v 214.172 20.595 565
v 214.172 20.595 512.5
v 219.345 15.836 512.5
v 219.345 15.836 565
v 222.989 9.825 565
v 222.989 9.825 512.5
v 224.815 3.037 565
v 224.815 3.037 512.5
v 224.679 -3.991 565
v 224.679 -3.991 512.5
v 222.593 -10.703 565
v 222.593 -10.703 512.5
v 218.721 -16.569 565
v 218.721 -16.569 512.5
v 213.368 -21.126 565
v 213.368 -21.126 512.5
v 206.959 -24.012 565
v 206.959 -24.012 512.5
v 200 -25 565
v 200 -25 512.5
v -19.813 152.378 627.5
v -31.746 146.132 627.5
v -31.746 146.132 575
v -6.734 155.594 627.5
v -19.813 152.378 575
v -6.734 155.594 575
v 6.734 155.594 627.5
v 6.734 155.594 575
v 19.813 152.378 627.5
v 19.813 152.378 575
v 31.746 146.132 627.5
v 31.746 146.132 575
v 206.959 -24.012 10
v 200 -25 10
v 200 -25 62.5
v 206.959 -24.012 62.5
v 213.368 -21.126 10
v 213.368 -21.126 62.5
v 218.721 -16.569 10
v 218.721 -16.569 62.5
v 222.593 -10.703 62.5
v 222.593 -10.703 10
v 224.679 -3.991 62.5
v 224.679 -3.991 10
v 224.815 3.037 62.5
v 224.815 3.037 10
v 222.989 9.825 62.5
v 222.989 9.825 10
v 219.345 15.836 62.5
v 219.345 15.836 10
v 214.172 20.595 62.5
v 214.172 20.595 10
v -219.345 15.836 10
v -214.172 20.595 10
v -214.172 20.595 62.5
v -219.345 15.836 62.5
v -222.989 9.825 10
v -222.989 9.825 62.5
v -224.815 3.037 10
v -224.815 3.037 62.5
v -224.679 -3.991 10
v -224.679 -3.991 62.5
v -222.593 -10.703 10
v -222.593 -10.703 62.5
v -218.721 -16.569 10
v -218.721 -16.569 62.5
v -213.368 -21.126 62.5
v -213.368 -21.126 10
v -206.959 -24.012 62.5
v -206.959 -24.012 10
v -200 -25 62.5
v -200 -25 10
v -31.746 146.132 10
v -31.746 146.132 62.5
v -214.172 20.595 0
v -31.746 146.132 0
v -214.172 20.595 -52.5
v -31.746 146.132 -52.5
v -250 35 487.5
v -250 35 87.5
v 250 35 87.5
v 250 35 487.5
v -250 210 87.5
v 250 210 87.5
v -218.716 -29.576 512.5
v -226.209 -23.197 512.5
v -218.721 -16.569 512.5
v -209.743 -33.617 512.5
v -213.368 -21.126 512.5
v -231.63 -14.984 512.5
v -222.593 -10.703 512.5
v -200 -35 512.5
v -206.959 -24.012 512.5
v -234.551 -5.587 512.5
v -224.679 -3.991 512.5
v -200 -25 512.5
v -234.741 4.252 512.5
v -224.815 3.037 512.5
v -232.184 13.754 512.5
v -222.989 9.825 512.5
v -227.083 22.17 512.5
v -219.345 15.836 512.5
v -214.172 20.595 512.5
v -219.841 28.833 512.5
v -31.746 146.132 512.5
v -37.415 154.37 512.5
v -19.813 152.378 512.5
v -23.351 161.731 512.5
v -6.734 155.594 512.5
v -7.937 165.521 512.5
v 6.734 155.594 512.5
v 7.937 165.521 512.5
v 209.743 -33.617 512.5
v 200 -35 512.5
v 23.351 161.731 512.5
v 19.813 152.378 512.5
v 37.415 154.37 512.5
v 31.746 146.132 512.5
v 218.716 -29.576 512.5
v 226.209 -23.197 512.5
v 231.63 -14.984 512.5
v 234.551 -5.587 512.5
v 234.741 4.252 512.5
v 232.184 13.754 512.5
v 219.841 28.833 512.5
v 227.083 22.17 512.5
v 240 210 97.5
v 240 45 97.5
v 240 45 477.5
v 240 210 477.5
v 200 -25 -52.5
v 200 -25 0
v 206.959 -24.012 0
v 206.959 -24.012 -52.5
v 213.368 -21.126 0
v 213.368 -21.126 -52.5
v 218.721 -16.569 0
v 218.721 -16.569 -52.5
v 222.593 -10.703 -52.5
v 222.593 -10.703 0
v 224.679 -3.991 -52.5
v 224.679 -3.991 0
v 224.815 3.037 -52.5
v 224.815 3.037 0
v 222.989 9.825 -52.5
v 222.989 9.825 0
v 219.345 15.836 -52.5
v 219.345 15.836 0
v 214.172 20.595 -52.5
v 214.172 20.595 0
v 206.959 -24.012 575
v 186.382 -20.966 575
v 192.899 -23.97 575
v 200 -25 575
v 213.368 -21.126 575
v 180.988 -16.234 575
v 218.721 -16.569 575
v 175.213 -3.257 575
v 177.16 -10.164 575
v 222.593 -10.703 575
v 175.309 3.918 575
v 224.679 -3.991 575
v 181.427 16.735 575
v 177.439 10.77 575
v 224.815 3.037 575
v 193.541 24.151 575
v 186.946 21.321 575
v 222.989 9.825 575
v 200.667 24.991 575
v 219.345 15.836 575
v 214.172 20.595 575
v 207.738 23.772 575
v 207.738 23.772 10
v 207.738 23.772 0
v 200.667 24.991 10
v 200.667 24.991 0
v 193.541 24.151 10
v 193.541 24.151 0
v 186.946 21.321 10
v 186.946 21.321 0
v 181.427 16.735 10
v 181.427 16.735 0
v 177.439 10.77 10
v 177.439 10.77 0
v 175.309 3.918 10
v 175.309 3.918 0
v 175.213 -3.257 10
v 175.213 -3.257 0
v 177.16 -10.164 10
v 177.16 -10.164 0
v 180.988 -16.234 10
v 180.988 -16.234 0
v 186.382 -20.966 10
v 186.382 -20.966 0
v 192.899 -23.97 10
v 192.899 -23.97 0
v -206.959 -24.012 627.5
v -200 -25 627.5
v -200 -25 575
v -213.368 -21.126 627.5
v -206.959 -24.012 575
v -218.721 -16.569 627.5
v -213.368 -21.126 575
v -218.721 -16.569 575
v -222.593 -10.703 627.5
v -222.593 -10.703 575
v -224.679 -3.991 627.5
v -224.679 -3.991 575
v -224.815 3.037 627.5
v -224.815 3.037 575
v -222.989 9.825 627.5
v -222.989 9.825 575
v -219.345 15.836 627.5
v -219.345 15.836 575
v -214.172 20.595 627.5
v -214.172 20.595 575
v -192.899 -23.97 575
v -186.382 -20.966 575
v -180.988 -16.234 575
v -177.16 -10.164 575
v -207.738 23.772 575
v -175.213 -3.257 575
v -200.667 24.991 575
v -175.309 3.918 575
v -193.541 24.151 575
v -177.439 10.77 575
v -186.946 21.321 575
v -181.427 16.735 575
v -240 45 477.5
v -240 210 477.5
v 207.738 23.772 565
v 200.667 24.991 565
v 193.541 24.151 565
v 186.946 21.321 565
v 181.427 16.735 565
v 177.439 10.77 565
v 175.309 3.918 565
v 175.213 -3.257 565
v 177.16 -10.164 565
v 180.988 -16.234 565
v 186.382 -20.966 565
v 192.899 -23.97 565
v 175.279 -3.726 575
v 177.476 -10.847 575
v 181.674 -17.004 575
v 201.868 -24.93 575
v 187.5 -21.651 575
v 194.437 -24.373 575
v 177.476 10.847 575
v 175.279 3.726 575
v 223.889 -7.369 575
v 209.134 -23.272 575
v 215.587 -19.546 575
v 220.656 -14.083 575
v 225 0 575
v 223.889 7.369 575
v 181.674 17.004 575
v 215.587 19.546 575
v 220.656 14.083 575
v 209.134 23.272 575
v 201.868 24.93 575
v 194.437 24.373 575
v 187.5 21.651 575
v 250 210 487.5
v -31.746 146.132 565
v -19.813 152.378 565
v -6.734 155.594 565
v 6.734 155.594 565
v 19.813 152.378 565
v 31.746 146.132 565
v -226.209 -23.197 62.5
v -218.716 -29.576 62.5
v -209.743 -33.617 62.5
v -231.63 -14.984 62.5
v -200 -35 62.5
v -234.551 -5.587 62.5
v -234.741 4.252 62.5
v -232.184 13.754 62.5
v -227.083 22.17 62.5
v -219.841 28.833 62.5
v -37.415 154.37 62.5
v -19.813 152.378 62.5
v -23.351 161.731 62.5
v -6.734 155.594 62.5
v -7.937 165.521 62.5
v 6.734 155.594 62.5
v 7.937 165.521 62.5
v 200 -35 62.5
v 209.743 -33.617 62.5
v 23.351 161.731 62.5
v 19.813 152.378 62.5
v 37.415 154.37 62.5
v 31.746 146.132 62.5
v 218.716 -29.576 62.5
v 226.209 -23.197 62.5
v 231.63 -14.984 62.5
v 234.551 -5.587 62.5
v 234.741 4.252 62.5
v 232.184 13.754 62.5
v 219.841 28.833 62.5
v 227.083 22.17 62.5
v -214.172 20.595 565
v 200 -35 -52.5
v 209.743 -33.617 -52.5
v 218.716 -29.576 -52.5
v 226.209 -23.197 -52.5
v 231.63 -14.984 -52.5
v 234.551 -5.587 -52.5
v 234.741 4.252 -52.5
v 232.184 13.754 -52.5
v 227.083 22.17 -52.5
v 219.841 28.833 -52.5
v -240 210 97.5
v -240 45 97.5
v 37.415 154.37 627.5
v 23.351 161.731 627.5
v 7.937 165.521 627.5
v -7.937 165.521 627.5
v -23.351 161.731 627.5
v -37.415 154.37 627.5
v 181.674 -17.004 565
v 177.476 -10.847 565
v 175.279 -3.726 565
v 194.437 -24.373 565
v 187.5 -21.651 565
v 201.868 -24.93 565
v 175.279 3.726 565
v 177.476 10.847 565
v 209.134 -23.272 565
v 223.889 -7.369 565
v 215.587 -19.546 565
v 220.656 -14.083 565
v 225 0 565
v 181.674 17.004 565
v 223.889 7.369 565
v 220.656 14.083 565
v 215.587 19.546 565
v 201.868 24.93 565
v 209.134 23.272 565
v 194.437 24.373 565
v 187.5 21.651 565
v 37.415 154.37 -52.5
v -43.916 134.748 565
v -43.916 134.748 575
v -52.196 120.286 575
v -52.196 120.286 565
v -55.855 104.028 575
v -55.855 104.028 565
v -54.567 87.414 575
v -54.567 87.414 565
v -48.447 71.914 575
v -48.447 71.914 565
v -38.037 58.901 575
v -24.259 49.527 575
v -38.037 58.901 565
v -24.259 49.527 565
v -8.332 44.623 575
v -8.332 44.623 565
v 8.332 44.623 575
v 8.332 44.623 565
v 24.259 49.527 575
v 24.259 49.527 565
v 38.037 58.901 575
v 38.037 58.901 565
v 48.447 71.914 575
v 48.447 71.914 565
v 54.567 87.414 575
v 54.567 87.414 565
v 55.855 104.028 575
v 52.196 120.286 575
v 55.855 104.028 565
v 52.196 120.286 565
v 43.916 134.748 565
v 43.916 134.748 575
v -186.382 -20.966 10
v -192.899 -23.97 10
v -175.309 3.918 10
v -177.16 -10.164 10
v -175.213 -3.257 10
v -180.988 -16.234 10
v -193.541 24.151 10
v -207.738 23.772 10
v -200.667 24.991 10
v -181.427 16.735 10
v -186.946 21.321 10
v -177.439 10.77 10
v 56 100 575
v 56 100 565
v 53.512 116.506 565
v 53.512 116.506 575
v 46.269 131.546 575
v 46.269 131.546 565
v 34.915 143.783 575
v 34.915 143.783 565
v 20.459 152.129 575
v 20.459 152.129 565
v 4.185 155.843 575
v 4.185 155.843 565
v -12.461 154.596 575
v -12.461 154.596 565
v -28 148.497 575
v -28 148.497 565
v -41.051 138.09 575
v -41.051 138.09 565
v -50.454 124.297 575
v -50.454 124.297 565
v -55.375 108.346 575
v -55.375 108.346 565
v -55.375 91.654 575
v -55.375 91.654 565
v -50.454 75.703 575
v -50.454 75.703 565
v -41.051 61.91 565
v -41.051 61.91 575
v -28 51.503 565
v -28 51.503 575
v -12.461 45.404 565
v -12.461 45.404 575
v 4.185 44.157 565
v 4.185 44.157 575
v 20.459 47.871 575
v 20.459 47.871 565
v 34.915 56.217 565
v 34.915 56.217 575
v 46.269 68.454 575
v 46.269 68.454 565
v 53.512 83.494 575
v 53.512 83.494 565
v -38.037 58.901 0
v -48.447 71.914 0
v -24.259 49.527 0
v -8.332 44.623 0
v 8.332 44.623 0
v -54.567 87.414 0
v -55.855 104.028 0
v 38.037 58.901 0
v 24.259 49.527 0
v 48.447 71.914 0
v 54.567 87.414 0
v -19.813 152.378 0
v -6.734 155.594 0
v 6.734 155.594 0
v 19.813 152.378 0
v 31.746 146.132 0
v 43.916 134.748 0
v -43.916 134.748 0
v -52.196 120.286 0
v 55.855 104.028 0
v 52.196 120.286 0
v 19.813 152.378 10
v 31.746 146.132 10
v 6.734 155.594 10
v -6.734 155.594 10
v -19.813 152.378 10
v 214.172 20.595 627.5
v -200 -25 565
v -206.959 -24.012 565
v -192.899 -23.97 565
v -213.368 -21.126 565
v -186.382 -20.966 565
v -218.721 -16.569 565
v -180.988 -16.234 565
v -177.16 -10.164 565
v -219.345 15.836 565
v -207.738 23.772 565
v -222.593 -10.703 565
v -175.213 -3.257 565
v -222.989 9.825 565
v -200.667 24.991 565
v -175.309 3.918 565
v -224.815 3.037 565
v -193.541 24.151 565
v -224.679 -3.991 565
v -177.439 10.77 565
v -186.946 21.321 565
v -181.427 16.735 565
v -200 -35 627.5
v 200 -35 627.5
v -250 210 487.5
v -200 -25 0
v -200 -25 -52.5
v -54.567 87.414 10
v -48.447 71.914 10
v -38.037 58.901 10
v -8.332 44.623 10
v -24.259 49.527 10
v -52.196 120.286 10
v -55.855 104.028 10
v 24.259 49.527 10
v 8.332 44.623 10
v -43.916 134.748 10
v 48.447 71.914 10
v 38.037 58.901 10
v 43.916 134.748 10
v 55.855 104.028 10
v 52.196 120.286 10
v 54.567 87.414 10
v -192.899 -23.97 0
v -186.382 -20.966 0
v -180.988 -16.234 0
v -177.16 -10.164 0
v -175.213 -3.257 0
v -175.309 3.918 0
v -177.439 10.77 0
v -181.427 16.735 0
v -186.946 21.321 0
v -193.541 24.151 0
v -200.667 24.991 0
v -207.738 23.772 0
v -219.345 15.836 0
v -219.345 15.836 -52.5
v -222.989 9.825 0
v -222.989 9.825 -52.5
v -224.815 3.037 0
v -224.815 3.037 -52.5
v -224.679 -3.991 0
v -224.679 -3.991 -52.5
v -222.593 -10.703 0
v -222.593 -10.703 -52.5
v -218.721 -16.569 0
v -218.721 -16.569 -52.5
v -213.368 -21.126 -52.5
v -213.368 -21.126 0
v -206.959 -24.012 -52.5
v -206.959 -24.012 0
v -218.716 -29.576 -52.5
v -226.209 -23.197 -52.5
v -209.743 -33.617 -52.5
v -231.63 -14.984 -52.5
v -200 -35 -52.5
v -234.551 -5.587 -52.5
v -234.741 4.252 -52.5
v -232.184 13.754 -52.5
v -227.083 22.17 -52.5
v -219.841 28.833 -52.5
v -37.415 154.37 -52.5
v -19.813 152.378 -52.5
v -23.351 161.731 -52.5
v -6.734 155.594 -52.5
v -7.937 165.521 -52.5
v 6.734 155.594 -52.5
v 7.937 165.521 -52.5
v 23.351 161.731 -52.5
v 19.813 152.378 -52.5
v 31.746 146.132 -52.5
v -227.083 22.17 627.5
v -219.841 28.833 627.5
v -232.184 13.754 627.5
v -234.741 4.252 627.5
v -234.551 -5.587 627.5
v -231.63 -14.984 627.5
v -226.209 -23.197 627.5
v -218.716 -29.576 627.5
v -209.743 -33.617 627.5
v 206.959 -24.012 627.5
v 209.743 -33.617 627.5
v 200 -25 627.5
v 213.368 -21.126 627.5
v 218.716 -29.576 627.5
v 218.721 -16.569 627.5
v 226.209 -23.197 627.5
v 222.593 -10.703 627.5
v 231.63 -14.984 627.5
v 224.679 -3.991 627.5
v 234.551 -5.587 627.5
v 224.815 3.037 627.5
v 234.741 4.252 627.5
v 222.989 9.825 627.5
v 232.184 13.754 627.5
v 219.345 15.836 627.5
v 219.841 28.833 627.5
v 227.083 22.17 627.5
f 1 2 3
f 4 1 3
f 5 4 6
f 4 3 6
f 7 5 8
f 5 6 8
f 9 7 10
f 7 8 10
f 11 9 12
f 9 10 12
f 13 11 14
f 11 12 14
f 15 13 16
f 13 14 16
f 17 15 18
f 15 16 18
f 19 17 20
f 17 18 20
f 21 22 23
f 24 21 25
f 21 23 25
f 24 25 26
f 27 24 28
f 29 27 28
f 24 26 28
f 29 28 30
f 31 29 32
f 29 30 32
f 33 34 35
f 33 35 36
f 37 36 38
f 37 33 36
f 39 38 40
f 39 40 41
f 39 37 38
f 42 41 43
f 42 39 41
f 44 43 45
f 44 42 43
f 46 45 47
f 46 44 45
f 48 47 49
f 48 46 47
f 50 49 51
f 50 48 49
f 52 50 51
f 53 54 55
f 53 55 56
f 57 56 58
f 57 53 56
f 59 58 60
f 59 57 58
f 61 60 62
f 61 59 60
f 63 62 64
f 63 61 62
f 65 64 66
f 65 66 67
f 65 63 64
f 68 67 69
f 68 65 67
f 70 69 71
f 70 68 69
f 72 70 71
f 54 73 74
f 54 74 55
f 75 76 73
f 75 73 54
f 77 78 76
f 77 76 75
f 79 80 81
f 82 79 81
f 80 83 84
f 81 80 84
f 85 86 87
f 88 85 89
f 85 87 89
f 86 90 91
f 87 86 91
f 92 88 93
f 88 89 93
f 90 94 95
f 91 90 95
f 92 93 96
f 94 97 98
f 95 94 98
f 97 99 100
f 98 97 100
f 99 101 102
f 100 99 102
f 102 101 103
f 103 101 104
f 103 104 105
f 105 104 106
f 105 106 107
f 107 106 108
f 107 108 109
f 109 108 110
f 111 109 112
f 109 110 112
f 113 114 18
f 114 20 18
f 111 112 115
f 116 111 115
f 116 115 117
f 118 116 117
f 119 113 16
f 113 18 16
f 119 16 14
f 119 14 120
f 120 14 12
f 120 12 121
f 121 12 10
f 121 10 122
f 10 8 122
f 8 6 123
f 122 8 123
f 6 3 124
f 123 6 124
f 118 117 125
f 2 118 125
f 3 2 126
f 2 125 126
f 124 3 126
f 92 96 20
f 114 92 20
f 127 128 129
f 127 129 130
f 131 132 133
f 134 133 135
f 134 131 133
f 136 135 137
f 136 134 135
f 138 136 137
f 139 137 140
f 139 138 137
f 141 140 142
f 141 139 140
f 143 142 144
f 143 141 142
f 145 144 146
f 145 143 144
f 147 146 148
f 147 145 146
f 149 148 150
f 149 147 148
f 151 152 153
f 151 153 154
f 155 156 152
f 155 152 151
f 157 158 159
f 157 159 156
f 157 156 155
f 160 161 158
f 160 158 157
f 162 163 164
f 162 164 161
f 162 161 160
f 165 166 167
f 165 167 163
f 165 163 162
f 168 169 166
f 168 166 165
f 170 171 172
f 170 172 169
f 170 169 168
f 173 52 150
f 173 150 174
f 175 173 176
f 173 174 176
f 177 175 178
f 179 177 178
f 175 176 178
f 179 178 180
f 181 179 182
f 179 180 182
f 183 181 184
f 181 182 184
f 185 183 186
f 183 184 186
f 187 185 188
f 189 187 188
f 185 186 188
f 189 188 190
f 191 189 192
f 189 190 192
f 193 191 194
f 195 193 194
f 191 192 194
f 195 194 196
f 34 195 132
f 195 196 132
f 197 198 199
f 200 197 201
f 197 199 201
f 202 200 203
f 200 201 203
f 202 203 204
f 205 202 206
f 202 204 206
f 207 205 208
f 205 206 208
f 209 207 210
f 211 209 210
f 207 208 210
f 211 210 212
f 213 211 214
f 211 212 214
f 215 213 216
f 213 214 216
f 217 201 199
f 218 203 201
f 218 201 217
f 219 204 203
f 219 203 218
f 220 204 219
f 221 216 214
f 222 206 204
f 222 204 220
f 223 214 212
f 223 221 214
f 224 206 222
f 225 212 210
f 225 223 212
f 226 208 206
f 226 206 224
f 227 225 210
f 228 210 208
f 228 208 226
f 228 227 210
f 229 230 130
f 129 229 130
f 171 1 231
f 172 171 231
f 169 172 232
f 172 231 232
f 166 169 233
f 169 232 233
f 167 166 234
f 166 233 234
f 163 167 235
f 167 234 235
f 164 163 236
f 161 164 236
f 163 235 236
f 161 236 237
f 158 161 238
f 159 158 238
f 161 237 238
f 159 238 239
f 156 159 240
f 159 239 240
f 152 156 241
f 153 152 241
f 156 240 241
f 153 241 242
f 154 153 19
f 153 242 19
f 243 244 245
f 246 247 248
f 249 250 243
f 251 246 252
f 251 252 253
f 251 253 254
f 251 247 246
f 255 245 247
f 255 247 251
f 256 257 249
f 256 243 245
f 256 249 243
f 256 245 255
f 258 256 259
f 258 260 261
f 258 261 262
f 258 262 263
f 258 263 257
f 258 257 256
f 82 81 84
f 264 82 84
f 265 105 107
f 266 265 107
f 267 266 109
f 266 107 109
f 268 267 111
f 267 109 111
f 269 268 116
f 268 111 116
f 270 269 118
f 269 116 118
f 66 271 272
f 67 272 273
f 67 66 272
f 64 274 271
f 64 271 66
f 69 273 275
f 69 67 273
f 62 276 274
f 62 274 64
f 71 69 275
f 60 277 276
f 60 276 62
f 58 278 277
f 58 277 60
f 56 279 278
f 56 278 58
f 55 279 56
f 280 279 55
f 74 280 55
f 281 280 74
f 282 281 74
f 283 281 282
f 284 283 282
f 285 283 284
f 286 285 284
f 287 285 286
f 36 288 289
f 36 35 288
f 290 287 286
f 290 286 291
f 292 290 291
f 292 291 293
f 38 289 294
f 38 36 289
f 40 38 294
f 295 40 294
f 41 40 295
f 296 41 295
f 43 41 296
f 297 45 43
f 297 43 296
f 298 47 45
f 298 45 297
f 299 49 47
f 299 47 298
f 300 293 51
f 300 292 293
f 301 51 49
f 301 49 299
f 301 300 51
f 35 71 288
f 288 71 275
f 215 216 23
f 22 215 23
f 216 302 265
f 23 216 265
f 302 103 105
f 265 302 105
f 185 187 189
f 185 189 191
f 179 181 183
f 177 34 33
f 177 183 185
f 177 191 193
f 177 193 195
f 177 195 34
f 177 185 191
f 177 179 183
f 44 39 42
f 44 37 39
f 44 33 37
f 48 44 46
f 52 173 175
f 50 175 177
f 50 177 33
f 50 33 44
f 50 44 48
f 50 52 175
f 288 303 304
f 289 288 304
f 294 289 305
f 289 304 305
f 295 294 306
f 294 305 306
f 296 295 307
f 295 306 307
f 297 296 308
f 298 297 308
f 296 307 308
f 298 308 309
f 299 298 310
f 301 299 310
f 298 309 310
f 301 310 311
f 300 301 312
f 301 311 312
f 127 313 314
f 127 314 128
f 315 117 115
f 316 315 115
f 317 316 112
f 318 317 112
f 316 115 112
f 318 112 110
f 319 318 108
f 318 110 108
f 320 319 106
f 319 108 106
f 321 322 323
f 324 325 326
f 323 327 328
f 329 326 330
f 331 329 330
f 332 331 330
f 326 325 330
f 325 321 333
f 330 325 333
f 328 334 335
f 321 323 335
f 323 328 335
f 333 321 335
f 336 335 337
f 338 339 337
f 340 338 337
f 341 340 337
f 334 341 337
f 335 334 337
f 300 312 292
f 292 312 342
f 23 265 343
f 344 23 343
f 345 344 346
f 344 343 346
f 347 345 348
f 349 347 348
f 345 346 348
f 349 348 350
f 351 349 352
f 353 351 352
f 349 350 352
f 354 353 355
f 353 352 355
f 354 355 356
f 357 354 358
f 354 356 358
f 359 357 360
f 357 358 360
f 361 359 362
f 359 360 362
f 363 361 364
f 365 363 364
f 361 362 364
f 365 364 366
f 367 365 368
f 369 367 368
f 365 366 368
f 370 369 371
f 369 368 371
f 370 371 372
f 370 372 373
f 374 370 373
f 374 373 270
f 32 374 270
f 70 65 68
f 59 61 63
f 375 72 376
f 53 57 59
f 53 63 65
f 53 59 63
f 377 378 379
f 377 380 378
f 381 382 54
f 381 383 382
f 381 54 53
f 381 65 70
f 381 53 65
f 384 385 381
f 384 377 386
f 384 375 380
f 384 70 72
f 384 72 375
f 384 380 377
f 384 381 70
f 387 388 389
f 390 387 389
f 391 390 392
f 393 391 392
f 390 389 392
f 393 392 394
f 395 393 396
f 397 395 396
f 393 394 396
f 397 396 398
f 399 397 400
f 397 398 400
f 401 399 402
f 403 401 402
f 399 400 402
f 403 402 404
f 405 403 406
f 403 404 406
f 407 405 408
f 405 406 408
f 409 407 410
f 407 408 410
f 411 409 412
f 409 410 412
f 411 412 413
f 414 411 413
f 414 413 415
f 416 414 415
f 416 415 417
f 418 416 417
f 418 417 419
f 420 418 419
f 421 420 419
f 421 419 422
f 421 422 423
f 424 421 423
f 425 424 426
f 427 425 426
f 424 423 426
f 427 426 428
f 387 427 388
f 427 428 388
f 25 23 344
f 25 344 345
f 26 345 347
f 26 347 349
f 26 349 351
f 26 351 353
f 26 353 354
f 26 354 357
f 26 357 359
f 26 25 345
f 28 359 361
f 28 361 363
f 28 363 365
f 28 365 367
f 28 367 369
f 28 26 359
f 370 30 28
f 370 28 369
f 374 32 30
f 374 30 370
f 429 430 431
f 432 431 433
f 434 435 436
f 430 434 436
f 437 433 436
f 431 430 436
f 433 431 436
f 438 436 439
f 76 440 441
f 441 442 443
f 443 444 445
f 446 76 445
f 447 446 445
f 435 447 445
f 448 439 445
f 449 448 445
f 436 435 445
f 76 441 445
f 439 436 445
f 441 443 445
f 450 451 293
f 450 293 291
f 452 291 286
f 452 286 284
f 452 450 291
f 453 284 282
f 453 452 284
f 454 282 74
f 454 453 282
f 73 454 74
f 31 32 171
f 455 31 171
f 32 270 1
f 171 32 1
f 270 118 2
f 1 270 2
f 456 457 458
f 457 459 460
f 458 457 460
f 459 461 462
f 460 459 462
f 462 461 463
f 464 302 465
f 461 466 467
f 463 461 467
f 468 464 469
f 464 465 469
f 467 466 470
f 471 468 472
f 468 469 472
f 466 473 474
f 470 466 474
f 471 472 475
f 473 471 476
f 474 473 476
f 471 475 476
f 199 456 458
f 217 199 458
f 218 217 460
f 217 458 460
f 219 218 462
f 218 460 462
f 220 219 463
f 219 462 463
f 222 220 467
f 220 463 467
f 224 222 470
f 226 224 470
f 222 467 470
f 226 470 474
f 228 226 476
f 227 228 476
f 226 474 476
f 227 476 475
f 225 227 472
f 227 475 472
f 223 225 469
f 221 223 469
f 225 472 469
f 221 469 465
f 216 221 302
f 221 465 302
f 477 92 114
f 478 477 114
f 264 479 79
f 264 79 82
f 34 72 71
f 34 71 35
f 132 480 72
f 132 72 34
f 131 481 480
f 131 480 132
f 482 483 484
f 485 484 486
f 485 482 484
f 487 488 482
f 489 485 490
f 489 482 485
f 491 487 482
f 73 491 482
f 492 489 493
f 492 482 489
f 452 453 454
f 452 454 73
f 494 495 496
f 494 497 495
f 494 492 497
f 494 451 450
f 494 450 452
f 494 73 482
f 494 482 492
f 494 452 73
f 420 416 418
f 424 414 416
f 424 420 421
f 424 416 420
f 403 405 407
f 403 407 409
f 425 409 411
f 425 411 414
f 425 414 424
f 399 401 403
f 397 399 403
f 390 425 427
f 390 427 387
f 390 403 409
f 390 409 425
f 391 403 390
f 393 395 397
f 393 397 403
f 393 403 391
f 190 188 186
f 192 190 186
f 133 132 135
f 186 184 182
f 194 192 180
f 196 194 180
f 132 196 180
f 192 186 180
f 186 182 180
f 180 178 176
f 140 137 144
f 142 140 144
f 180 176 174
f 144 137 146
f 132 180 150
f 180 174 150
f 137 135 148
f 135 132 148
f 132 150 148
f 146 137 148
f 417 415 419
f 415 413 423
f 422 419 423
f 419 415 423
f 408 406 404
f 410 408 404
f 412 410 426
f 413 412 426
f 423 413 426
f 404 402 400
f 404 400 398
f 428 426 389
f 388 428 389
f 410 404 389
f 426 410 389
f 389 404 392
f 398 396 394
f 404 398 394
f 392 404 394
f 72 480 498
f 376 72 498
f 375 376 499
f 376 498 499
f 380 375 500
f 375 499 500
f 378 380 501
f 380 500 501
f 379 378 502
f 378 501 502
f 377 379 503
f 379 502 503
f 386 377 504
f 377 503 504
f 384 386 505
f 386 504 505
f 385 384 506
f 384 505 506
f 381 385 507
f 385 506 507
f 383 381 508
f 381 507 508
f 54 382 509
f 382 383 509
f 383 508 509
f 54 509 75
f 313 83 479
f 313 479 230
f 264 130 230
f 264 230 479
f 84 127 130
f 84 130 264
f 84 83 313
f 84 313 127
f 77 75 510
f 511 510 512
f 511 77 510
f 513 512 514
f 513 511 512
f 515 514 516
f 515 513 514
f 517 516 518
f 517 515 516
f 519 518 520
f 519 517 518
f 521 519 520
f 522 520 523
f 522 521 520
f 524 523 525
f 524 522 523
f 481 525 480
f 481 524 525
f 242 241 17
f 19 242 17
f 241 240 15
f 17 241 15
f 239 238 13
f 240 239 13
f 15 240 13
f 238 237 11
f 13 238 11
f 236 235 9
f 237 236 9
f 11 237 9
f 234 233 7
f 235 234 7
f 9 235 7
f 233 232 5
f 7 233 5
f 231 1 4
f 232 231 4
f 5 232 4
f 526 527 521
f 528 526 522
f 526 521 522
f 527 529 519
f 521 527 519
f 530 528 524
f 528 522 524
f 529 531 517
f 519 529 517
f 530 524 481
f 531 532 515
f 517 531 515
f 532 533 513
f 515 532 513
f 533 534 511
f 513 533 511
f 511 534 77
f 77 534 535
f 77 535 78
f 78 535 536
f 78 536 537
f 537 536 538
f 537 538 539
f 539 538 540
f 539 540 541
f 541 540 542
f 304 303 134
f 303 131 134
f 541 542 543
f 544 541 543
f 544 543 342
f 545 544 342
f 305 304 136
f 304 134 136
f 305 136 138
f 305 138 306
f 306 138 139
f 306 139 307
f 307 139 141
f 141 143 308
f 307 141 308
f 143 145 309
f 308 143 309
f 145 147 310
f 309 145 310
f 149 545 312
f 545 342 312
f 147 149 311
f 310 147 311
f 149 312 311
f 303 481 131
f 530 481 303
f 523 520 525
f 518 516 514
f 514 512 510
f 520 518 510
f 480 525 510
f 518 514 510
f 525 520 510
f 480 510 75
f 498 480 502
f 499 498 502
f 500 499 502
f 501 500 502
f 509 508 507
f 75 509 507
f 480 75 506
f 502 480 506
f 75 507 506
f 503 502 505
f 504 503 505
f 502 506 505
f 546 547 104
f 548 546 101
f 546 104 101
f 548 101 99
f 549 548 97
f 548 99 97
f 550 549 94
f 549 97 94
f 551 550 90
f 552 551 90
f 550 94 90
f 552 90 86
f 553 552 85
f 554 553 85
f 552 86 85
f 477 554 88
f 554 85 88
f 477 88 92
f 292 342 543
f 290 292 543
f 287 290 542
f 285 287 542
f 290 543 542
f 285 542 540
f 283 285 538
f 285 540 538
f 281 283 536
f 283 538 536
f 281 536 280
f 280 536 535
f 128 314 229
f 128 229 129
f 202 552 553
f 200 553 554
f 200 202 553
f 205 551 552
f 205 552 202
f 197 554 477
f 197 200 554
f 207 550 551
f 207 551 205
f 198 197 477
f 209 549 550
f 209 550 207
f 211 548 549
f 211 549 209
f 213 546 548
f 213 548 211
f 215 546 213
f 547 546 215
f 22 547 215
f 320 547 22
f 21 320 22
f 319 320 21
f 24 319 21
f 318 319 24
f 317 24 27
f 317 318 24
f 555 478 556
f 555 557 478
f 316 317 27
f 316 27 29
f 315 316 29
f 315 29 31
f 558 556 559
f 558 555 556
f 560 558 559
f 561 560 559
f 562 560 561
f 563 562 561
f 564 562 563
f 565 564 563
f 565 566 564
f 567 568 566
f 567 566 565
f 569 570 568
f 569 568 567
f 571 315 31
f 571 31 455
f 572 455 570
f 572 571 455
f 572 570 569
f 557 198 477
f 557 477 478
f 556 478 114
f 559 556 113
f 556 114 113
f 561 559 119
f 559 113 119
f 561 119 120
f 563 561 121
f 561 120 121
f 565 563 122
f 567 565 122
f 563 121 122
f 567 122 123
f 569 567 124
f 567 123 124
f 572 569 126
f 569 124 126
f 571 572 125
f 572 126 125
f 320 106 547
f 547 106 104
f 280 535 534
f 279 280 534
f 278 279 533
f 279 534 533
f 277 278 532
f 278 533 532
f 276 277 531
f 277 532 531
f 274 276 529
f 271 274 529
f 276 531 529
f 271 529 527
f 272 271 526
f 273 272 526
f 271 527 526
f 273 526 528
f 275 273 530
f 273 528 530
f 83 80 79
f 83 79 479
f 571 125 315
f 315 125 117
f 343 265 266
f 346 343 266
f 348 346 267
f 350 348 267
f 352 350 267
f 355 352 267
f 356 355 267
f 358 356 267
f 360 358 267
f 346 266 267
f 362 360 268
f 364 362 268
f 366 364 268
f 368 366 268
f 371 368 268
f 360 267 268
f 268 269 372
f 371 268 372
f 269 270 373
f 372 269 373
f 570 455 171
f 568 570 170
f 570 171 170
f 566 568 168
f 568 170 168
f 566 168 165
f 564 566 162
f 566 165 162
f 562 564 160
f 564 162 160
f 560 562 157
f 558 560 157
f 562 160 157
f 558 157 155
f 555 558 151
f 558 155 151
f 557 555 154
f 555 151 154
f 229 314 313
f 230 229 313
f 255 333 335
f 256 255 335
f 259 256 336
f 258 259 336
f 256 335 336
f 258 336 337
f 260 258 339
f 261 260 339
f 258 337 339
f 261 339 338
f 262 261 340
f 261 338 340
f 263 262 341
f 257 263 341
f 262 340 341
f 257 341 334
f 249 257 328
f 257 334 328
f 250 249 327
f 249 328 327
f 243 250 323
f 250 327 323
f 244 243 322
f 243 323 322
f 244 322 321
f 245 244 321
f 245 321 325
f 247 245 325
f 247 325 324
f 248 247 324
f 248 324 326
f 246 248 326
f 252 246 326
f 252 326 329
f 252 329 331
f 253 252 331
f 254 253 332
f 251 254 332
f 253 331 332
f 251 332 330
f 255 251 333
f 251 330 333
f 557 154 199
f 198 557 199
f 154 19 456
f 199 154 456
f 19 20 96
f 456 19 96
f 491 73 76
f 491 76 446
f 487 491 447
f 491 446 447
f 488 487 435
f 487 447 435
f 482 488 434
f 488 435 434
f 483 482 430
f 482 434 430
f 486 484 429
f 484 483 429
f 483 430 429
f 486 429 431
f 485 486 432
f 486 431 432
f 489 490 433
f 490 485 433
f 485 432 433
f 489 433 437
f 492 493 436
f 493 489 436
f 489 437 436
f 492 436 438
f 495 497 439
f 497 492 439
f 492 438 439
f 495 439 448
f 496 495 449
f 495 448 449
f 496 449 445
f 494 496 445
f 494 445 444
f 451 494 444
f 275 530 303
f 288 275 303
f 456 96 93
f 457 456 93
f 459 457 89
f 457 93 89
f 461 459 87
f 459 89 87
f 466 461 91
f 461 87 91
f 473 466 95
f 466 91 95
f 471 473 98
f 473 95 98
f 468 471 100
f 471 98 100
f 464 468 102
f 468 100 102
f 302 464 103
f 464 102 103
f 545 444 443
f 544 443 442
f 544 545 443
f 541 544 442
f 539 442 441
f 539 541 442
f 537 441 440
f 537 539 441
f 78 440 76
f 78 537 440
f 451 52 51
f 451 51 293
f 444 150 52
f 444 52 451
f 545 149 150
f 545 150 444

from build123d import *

# Parameters (mm, degrees)
SCHIZZO1_R                     = 25
ESTRUSIONE_ESTRUSIONE1_DEPTH   = 10
ESTRUSIONE_ESTRUSIONE1_2_DEPTH = 10
SCHIZZO1_R_2                   = 56
ESTRUSIONE_ESTRUSIONE1_3_DEPTH = 10
ESTRUSIONE_SOTTILE1_START      = -62.5
ESTRUSIONE_SOTTILE1_DEPTH      = 115
SCHIZZO3_W                     = 500
SCHIZZO3_H                     = 175
ESTRUSIONE_ESTRUSIONE2_DEPTH   = 400
RIPETIZIONE_START              = 565
RIPETIZIONE_A_L1_OUTLINE_R     = 56
RIPETIZIONE_A_L1_DEPTH         = 10
RIPETIZIONE_A_L1_2_OUTLINE_R   = 25
RIPETIZIONE_A_L1_2_DEPTH       = 10
RIPETIZIONE_START_2            = 512.5
RIPETIZIONE_A_L1_3_DEPTH       = 115
RIPETIZIONE_A_L1_4_DEPTH       = 10
SVUOTA1_T                      = -10


# Read off the part's stored shape, not the designer's step: Ripetizione a L1
with BuildPart() as part:
    # Schizzo1 → Estrusione-Estrusione1 (new body)
    with BuildSketch(Plane.XY):
        with Locations((-200, 0)):
            Circle(SCHIZZO1_R)
    extrude(amount=ESTRUSIONE_ESTRUSIONE1_DEPTH)



with BuildPart() as body_2:
    # Schizzo1 → Estrusione-Estrusione1 2 (new body)
    with BuildSketch(Plane.XY):
        with Locations((200, 0)):
            Circle(SCHIZZO1_R)
    extrude(amount=ESTRUSIONE_ESTRUSIONE1_2_DEPTH)


with BuildPart() as body_3:
    # Schizzo1 → Estrusione-Estrusione1 3 (new body)
    with BuildSketch(Plane.XY):
        with Locations((0, 100)):
            Circle(SCHIZZO1_R_2)
    extrude(amount=ESTRUSIONE_ESTRUSIONE1_3_DEPTH)


with BuildPart() as part_1:
    add(part.part)

    add(body_2.part)  # Estrusione-Sottile1 merges body 2

    add(body_3.part)  # Estrusione-Sottile1 merges body 3
    # Schizzo2 → Estrusione-Sottile1 (add)
    with BuildSketch(Plane.XY.offset(10).offset(ESTRUSIONE_SOTTILE1_START)):
        with BuildLine():
            Line((219.84132575, 28.8326515), (37.415071414, 154.370142828))
            ThreePointArc((37.415071414, 154.370142828), (0, 166), (-37.415071414, 154.370142828))
            Line((-37.415071414, 154.370142828), (-219.84132575, 28.8326515))
            ThreePointArc((-219.84132575, 28.8326515), (-233.422618109, -10.388868984), (-200, -35))
            Line((-200, -35), (200, -35))
            ThreePointArc((200, -35), (233.422618109, -10.388868984), (219.84132575, 28.8326515))
        make_face()
        with BuildLine():
            Line((214.172375536, 20.594751071), (31.7461212, 146.132242399))
            ThreePointArc((31.7461212, 146.132242399), (0, 156), (-31.7461212, 146.132242399))
            Line((-31.7461212, 146.132242399), (-214.172375536, 20.594751071))
            ThreePointArc((-214.172375536, 20.594751071), (-223.873298649, -7.420620703), (-200, -25))
            Line((-200, -25), (200, -25))
            ThreePointArc((200, -25), (223.873298649, -7.420620703), (214.172375536, 20.594751071))
        make_face(mode=Mode.SUBTRACT)
    extrude(amount=ESTRUSIONE_SOTTILE1_DEPTH)


with BuildPart() as body_2_2:
    # Schizzo3 → Estrusione-Estrusione2 (new body)
    with BuildSketch(Plane.XY.offset(87.5)):
        with Locations((0, 122.5)):
            Rectangle(SCHIZZO3_W, SCHIZZO3_H)
    extrude(amount=ESTRUSIONE_ESTRUSIONE2_DEPTH)

    # Svuota1
    svuota1_openings = [body_2_2.faces().sort_by_distance(p)[0] for p in [
        (0, 210, 287.5),
    ]]
    offset(amount=SVUOTA1_T, openings=svuota1_openings, kind=Kind.INTERSECTION)


with BuildPart() as body_3_2:
    # Ripetizione a L1 outline → Ripetizione a L1 (new body)
    with BuildSketch(Plane.XY.offset(RIPETIZIONE_START)):
        with Locations((0, 100)):
            Circle(RIPETIZIONE_A_L1_OUTLINE_R)
    extrude(amount=RIPETIZIONE_A_L1_DEPTH)


with BuildPart() as body_4:
    # Ripetizione a L1 2 outline → Ripetizione a L1 2 (new body)
    with BuildSketch(Plane.XY.offset(RIPETIZIONE_START)):
        with Locations((200, 0)):
            Circle(RIPETIZIONE_A_L1_2_OUTLINE_R)
    extrude(amount=RIPETIZIONE_A_L1_2_DEPTH)


with BuildPart() as body_5:
    # Ripetizione a L1 3 outline → Ripetizione a L1 3 (new body)
    with BuildSketch(Plane.XY.offset(RIPETIZIONE_START_2)):
        with BuildLine():
            ThreePointArc((37.415071414, 154.370142828), (0, 166), (-37.415071414, 154.370142828))
            Line((-37.415071414, 154.370142828), (-219.84132575, 28.8326515))
            ThreePointArc((-219.84132575, 28.8326515), (-233.422618109, -10.388868983), (-200, -35))
            Line((-200, -35), (200, -35))
            ThreePointArc((200, -35), (233.422618109, -10.388868983), (219.84132575, 28.8326515))
            Line((219.84132575, 28.8326515), (37.415071414, 154.370142828))
        make_face()
        with BuildLine():
            Line((-214.172375536, 20.594751071), (-31.7461212, 146.132242399))
            ThreePointArc((-31.7461212, 146.132242399), (0, 156), (31.7461212, 146.132242399))
            Line((31.7461212, 146.132242399), (214.172375536, 20.594751071))
            ThreePointArc((214.172375536, 20.594751071), (223.873298649, -7.420620703), (200, -25))
            Line((200, -25), (-200, -25))
            ThreePointArc((-200, -25), (-223.873298649, -7.420620703), (-214.172375536, 20.594751071))
        make_face(mode=Mode.SUBTRACT)
    extrude(amount=RIPETIZIONE_A_L1_3_DEPTH)

    # Ripetizione a L1 4 outline → Ripetizione a L1 4 (add)
    with BuildSketch(Plane.XY.offset(RIPETIZIONE_START)):
        with BuildLine():
            ThreePointArc((31.7461212, 146.132242399), (0, 156), (-31.7461212, 146.132242399))
            ThreePointArc((-31.7461212, 146.132242399), (0, 44), (31.7461212, 146.132242399))
        make_face()
        with BuildLine():
            ThreePointArc((-200, -25), (-176.126701351, 7.420620703), (-214.172375536, 20.594751071))
            ThreePointArc((-214.172375536, 20.594751071), (-223.873298649, -7.420620703), (-200, -25))
        make_face()
        with BuildLine():
            ThreePointArc((200, -25), (223.873298649, -7.420620703), (214.172375536, 20.594751071))
            ThreePointArc((214.172375536, 20.594751071), (176.126701351, 7.420620703), (200, -25))
        make_face()
    extrude(amount=RIPETIZIONE_A_L1_4_DEPTH)


solid = Compound([part_1.part, body_2_2.part, body_3_2.part, body_4.part, body_5.part])
